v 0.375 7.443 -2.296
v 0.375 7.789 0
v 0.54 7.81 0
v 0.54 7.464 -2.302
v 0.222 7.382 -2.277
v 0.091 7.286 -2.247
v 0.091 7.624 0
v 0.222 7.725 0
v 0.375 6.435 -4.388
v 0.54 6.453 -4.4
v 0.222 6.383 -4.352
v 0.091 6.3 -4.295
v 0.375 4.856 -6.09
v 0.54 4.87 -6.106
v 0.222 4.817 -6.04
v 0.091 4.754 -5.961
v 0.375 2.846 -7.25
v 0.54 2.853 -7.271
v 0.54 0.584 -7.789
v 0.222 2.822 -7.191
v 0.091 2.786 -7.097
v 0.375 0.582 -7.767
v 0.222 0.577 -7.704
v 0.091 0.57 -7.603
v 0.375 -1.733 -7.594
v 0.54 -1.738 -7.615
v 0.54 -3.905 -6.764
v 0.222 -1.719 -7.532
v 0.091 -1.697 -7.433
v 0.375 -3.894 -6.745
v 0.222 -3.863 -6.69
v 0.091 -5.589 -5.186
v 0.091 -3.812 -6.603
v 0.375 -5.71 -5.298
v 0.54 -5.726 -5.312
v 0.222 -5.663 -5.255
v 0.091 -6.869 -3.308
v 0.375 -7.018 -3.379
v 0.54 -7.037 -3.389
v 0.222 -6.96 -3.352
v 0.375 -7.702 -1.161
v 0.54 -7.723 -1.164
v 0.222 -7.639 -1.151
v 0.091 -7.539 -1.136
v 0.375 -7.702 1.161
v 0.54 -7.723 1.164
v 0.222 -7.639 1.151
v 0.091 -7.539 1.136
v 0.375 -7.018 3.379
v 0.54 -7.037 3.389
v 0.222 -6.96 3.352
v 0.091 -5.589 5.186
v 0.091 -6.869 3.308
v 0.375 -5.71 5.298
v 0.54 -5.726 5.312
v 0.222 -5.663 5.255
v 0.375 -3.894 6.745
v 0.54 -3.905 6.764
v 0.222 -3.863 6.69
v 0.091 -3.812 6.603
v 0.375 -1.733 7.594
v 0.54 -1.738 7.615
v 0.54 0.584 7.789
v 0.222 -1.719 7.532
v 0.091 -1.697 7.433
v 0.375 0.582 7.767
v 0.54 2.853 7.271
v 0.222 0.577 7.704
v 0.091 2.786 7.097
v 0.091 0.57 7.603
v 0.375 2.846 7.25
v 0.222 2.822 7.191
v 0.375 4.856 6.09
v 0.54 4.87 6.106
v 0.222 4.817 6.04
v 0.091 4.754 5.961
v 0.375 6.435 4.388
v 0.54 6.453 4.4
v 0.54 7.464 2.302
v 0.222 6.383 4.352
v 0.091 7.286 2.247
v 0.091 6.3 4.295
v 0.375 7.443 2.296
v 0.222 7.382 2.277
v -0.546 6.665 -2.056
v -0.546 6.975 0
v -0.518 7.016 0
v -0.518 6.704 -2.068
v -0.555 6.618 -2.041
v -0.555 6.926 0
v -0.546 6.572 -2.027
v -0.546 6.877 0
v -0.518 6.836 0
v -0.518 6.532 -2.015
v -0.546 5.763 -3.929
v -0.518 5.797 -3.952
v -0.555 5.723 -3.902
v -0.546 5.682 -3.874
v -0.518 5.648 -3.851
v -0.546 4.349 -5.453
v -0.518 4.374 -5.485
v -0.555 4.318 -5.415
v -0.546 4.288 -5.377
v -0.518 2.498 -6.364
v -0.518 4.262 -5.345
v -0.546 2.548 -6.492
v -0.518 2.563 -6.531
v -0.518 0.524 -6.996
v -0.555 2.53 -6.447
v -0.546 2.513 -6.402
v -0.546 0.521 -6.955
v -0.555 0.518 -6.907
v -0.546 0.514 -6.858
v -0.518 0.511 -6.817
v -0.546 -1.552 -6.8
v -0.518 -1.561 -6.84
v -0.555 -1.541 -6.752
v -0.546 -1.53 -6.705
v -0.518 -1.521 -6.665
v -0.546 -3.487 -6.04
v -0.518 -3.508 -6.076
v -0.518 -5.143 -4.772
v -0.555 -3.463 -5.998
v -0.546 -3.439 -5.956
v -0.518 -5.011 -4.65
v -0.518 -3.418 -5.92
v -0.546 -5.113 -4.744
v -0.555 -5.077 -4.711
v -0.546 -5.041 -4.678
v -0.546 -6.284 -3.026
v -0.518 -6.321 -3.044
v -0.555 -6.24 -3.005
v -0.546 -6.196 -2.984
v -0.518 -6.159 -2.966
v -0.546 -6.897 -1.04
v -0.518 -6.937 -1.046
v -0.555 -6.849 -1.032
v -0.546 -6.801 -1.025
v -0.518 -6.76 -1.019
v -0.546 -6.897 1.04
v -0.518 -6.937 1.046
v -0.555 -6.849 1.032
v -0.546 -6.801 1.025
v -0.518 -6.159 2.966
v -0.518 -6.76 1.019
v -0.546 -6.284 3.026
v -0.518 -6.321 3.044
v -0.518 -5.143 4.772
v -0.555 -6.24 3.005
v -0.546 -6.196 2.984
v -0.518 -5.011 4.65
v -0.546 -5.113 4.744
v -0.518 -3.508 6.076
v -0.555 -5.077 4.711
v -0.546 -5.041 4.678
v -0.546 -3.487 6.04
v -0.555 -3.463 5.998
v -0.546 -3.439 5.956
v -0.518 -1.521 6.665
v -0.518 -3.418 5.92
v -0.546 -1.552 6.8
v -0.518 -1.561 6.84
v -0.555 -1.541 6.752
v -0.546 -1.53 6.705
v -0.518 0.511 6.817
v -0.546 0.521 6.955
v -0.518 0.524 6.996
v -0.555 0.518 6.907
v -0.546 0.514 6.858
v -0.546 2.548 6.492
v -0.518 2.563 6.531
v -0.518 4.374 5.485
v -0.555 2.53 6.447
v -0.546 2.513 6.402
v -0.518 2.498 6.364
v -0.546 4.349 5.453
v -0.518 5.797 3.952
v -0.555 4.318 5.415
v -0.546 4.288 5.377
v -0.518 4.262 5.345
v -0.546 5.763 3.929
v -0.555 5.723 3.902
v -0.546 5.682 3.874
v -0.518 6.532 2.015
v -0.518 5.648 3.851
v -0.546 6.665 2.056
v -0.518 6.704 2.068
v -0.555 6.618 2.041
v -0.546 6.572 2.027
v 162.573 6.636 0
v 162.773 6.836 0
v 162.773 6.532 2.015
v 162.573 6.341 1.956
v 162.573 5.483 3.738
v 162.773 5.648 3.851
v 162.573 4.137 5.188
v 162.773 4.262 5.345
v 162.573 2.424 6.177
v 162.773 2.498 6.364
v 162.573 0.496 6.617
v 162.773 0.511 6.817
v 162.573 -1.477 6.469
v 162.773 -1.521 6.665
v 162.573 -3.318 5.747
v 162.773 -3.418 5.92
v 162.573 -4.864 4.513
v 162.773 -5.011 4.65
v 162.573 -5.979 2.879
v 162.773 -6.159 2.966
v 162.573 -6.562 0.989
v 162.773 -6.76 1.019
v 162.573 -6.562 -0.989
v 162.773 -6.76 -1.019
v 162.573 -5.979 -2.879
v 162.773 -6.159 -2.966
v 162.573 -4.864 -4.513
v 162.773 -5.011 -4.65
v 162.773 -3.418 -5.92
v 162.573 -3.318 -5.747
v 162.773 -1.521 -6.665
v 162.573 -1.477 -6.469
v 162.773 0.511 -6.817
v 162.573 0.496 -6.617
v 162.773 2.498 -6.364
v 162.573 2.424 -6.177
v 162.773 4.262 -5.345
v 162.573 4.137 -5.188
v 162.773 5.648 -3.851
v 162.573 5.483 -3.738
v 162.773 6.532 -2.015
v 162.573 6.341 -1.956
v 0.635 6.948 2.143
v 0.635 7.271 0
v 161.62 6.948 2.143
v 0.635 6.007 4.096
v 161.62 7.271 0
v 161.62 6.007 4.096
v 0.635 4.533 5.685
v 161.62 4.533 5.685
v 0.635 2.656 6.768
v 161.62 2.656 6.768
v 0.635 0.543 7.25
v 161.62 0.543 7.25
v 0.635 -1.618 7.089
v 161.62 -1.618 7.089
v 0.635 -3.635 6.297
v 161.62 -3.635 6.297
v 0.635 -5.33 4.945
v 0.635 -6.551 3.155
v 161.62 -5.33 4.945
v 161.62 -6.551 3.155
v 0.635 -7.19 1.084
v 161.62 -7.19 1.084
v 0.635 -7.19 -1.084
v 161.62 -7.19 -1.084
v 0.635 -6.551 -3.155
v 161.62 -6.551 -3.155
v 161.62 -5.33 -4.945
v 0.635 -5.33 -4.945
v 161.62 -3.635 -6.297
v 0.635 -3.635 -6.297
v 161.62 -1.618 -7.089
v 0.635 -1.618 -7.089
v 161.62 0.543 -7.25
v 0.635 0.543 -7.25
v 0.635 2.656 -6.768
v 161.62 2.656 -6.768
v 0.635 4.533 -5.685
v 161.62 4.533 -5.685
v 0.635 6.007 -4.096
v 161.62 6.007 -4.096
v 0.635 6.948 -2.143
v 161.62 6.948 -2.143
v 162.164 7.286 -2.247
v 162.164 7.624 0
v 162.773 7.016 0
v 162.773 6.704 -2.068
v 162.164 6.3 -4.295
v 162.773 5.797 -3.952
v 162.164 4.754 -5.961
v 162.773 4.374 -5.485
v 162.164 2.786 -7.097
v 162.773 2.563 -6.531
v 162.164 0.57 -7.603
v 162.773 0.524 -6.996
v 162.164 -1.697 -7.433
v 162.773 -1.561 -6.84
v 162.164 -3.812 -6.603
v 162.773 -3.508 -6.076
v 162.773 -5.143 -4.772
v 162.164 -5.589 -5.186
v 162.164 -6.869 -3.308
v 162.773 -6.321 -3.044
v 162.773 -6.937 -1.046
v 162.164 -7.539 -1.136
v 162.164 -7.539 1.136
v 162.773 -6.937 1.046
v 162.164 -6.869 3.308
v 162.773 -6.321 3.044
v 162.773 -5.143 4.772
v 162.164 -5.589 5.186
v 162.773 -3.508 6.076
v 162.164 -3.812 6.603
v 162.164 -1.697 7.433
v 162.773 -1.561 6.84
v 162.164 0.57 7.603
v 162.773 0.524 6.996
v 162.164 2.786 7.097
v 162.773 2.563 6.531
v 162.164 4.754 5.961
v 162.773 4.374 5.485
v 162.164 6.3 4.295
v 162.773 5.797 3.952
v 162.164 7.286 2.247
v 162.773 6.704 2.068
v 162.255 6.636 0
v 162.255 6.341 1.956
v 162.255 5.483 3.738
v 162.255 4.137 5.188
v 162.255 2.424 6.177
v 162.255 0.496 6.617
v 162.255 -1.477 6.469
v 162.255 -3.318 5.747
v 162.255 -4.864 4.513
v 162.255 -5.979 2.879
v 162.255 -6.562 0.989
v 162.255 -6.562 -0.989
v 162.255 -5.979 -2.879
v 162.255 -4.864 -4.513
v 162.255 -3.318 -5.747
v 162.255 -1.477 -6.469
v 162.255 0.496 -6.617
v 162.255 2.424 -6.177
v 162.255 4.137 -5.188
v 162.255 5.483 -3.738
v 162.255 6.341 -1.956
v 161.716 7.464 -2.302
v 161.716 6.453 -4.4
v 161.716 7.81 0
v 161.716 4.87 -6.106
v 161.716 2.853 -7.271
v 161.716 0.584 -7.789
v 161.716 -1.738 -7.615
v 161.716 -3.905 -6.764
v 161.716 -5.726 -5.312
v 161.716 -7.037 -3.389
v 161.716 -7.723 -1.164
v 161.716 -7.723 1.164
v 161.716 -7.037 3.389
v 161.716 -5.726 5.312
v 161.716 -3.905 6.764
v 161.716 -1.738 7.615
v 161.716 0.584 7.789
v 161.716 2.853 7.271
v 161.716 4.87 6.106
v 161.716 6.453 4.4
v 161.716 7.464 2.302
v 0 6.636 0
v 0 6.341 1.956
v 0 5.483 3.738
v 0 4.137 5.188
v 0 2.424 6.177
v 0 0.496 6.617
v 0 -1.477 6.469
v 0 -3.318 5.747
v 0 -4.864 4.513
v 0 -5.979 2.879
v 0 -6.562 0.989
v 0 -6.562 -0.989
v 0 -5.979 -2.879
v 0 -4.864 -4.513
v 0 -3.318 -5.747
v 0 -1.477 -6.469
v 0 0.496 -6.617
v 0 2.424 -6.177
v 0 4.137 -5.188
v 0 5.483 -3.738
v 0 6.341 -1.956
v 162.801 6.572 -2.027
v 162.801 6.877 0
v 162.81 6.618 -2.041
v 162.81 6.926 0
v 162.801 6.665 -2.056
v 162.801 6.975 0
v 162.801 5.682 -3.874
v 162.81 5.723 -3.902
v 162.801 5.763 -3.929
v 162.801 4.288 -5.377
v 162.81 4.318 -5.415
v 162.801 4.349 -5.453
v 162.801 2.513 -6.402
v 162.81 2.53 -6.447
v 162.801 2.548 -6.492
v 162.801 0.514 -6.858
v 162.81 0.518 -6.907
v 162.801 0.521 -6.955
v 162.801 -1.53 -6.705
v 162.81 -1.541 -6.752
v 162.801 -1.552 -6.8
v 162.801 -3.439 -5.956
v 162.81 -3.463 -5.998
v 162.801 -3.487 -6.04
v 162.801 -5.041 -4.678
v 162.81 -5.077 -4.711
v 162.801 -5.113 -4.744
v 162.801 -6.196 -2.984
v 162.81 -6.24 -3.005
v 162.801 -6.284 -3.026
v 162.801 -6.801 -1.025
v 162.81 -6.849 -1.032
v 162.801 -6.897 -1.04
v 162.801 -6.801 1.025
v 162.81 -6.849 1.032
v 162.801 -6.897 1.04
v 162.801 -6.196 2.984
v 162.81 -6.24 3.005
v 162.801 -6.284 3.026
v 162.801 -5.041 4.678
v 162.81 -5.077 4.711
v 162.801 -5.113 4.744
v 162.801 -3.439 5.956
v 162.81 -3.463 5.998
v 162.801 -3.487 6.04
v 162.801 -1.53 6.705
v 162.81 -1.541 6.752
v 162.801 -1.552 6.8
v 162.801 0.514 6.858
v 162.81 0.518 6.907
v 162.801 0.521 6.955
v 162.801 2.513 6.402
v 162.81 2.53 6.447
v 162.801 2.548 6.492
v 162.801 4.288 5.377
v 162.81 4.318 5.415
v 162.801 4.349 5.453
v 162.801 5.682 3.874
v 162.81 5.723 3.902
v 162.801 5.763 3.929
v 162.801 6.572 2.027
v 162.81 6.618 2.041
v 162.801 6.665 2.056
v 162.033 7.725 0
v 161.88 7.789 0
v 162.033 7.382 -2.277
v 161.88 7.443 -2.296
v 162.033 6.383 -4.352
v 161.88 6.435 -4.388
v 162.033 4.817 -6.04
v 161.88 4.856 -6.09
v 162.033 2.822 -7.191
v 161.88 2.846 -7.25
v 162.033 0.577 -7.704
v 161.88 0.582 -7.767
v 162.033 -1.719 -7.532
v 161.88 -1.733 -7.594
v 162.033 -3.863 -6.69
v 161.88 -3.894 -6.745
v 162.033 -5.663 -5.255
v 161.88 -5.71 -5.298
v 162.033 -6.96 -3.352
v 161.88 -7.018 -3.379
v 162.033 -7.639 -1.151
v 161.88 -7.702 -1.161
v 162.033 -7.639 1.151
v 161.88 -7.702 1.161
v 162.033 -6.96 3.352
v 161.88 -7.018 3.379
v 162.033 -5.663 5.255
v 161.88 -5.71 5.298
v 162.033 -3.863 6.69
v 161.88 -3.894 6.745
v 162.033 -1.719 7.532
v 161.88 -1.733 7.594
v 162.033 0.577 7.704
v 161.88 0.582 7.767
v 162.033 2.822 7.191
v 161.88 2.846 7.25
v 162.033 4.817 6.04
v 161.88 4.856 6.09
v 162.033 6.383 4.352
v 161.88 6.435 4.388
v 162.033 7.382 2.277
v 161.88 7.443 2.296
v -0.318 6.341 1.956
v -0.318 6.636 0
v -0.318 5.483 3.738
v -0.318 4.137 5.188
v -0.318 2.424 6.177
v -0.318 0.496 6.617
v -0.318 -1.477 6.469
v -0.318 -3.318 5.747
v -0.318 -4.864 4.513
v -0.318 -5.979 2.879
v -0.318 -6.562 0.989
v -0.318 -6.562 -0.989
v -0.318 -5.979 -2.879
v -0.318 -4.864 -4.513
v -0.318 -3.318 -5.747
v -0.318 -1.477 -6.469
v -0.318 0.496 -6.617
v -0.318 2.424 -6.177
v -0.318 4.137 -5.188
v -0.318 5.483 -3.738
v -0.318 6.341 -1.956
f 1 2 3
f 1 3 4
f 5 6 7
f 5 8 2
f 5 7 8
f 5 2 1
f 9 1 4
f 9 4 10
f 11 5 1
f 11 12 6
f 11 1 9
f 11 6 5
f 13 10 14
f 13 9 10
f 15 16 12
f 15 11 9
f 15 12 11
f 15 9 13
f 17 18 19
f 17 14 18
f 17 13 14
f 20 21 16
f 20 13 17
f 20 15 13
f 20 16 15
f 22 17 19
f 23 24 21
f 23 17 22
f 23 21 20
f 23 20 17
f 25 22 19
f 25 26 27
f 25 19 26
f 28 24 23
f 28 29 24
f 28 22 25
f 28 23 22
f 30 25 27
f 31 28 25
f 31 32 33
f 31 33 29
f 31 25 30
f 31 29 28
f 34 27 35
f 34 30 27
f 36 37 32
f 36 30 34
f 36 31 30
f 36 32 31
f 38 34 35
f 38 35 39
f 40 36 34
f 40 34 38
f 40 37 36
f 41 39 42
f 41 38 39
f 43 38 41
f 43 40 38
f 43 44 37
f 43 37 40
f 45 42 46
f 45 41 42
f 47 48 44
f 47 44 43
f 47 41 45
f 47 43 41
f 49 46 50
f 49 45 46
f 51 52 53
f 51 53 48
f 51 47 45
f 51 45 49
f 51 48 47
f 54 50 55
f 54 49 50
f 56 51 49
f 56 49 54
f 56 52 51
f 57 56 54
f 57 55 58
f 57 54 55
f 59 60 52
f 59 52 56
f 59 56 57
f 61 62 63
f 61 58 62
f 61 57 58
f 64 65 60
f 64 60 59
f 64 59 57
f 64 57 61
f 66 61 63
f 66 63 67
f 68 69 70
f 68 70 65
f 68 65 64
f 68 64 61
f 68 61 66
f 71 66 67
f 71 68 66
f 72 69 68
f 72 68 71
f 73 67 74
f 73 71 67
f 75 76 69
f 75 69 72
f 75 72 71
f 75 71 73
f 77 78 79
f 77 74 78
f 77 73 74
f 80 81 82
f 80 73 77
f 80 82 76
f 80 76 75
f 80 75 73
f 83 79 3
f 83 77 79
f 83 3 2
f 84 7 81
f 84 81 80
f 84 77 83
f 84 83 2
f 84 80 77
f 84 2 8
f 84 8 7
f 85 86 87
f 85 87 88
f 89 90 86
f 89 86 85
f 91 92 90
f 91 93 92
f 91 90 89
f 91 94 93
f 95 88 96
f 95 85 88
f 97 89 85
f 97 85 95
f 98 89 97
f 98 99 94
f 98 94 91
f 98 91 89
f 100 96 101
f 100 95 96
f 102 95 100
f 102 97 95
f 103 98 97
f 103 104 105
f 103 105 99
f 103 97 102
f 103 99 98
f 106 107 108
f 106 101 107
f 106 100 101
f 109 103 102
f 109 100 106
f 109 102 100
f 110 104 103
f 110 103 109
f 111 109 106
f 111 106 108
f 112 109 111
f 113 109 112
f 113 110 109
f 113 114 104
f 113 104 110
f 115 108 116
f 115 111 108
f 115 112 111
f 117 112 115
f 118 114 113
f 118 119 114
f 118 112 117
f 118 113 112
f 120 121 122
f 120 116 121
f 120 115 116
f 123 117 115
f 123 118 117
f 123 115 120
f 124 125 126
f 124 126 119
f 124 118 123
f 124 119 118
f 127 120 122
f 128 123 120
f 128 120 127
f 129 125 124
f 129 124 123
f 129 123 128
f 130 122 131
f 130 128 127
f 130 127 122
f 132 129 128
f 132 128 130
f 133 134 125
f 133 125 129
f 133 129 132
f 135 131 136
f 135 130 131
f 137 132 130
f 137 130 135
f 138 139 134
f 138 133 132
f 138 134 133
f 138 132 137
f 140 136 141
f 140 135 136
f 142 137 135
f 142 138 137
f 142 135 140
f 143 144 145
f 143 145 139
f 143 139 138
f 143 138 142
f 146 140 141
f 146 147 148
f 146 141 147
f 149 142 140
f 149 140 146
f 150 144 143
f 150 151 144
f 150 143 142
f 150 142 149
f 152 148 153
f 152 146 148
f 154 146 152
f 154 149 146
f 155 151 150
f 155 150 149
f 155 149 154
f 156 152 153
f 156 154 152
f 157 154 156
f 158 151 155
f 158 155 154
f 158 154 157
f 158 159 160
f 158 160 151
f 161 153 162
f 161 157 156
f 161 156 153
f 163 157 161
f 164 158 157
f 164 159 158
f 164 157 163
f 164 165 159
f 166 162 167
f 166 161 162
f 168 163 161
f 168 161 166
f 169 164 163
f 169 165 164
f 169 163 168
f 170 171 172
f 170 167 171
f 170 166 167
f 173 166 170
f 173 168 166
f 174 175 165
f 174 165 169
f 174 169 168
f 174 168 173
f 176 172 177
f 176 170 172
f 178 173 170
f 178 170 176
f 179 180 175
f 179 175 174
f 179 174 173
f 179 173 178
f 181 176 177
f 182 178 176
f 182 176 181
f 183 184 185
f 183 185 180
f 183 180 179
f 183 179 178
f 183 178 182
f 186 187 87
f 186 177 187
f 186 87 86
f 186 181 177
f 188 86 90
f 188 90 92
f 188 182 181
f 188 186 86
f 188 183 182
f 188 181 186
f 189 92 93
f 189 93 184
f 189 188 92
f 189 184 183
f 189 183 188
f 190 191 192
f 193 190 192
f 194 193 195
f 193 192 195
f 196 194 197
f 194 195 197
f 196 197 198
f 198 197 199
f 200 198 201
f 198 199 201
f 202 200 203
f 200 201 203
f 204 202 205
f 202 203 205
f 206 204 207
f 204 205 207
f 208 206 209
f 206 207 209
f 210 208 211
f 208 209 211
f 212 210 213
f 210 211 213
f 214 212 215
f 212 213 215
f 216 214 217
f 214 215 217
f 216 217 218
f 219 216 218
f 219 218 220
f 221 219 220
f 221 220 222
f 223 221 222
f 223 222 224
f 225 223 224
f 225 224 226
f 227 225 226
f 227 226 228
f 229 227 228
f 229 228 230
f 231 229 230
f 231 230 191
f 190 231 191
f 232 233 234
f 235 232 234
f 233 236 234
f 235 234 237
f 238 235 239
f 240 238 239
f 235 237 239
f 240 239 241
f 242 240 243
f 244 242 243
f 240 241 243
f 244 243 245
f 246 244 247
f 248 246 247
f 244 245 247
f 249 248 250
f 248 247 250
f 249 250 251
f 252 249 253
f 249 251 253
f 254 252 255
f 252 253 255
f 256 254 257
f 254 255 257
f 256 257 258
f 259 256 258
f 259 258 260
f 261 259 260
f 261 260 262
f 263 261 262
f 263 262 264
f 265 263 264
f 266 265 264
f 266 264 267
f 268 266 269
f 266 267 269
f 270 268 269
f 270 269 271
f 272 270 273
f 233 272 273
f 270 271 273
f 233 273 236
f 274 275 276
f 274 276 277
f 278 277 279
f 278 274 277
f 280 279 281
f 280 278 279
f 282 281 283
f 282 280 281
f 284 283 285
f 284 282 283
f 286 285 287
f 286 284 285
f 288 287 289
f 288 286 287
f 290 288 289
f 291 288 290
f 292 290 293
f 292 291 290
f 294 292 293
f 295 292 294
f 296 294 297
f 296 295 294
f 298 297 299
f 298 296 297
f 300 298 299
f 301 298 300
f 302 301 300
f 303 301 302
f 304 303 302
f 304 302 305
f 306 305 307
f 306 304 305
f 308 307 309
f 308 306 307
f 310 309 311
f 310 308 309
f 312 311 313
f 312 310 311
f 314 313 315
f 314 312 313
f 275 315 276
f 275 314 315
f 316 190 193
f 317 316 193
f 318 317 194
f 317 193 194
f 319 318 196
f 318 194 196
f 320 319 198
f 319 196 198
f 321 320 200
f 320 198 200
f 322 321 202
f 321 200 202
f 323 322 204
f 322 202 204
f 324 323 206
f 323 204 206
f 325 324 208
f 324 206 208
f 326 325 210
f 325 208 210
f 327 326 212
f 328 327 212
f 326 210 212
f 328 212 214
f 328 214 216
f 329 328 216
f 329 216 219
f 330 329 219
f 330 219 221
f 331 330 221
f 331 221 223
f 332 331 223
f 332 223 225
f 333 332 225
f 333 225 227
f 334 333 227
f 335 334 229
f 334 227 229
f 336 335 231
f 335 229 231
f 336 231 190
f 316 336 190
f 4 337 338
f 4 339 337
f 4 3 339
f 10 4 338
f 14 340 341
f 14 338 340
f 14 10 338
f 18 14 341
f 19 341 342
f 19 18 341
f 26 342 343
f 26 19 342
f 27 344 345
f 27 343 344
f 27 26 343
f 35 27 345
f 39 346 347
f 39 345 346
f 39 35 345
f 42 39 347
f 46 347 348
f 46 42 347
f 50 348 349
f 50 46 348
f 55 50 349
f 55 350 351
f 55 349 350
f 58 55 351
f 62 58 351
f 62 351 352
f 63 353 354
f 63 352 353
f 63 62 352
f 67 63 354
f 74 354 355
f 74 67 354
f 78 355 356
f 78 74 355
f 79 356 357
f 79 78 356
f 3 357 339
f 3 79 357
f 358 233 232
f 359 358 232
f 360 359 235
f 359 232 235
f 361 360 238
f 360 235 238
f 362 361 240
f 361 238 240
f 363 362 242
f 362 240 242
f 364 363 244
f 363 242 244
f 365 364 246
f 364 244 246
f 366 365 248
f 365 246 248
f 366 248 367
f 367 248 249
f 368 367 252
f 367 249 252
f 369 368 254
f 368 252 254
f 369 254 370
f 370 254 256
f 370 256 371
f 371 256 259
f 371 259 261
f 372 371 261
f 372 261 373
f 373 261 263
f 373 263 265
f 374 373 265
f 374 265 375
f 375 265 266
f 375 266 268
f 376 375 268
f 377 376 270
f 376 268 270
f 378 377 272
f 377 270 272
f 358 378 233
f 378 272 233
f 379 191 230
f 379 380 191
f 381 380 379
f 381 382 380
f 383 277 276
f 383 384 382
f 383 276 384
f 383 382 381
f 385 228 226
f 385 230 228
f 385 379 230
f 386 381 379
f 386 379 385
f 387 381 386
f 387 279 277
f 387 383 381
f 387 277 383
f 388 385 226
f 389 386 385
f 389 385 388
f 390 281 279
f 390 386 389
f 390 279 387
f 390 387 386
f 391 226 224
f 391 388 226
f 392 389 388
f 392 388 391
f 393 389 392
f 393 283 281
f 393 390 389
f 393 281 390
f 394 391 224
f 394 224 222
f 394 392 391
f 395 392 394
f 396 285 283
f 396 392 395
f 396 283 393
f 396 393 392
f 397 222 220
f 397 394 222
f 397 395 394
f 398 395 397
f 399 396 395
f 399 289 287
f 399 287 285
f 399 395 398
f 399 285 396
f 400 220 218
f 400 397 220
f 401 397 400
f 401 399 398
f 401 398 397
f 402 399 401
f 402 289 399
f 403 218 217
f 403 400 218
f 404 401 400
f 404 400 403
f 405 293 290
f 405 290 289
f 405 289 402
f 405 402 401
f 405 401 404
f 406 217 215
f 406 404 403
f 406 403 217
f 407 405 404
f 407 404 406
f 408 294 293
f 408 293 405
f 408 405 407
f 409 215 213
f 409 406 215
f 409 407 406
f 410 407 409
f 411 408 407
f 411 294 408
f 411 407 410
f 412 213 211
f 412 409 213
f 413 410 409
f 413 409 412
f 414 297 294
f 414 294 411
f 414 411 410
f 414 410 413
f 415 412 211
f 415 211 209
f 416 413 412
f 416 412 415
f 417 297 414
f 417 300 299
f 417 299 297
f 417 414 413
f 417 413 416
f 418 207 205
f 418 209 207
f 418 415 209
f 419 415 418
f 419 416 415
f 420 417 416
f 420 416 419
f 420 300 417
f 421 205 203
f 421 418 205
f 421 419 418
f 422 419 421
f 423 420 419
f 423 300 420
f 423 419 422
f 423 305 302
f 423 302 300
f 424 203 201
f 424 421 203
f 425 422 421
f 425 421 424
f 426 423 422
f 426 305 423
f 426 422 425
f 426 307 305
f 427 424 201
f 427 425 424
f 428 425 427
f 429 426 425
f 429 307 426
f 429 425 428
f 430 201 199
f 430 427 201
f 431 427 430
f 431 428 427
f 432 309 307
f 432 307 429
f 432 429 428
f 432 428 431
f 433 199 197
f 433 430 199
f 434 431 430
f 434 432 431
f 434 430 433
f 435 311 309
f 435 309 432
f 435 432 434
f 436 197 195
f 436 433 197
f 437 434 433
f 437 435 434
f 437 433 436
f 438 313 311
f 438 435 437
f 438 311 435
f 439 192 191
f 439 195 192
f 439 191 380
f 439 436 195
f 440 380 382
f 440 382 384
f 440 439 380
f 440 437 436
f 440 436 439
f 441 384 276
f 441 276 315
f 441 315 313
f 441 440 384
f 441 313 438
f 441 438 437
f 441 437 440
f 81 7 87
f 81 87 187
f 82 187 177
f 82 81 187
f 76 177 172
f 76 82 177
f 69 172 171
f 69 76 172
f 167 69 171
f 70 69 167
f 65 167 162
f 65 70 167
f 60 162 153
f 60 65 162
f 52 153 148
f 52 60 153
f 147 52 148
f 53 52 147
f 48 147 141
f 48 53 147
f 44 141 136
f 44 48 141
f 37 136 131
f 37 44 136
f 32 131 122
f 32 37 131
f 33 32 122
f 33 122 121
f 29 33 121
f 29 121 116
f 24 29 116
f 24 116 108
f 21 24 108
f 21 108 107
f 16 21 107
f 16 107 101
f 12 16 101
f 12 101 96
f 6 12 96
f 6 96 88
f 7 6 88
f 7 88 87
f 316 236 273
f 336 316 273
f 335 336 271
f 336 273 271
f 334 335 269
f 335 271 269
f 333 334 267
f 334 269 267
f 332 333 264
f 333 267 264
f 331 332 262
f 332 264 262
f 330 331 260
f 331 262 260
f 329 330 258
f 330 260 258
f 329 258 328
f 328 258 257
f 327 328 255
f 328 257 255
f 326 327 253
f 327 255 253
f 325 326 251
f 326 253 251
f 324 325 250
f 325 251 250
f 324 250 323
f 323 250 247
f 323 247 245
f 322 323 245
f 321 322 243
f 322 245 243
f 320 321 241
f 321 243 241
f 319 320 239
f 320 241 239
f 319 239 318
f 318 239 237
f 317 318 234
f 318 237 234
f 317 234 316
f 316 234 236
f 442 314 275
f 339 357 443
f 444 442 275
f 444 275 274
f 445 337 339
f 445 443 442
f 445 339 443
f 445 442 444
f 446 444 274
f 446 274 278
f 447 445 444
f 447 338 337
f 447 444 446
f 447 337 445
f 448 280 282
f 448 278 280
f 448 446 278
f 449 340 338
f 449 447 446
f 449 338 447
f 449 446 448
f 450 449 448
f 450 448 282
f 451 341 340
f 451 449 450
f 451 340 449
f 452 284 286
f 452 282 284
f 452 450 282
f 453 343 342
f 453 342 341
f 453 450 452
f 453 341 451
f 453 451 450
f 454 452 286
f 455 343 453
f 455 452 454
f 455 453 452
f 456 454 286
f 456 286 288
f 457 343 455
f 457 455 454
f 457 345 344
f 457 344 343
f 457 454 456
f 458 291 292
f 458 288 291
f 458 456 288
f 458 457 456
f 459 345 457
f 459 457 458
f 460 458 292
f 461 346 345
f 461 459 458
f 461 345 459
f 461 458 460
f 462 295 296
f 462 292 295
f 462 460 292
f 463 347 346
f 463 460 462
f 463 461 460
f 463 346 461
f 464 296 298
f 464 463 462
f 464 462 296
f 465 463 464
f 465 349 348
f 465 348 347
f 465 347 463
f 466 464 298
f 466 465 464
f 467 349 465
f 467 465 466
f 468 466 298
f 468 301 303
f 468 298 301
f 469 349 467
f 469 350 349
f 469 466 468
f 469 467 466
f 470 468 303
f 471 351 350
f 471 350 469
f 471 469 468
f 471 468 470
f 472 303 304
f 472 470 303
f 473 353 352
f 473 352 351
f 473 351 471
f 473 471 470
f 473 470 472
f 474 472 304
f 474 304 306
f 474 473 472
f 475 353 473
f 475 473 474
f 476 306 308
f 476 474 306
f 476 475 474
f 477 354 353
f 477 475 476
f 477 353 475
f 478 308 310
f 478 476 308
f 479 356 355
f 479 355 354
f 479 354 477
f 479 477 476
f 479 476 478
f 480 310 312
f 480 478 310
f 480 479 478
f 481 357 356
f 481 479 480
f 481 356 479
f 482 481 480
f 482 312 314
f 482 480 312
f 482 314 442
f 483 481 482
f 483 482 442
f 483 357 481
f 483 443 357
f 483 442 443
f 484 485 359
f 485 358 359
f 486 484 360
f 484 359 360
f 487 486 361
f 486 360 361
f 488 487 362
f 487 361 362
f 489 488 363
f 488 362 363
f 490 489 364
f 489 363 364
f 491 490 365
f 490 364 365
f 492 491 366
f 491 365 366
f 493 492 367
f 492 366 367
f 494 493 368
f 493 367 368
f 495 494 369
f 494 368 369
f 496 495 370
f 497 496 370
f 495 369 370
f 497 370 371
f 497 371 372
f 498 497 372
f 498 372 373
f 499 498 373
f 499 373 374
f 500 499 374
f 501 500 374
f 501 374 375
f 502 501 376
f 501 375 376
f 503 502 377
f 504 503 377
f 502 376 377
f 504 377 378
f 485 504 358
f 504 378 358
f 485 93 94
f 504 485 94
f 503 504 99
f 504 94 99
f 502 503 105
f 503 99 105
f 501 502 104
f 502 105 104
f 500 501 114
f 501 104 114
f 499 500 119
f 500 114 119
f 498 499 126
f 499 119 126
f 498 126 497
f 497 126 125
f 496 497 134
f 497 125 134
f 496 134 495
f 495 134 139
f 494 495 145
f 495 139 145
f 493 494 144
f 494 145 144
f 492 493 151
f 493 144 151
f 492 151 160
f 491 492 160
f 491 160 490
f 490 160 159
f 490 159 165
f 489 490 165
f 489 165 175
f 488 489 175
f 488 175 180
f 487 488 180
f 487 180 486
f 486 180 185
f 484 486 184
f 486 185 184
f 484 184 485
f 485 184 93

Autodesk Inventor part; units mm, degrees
sketch "Sketch_1" plane through (0, 0, 0) normal (0, 0, 1) x (1, 0, 0)
  line L0 (162.2552, 0) -> (0, 0)
  arc A0 (-0.518, 7.0158) -> (-0.518, 6.8362) centre (-0.4282, 6.926) ccw
  line L1 (-0.518, 6.8362) -> (-0.3175, 6.6357)
  line L2 (-0.3175, 6.6357) -> (0, 6.6357)
  line L3 (0, 6.6357) -> (0.635, 7.2708)
  line L4 (0.635, 7.2708) -> (161.6202, 7.2708)
  line L5 (161.6202, 7.2708) -> (162.2552, 6.6357)
  line L6 (162.2552, 6.6357) -> (162.5727, 6.6357)
  line L7 (162.5727, 6.6357) -> (162.7732, 6.8362)
  arc A1 (162.7732, 6.8362) -> (162.7732, 7.0158) centre (162.6834, 6.926) ccw
  line L8 (162.7732, 7.0158) -> (162.1645, 7.6245)
  arc A2 (162.1645, 7.6245) -> (161.7155, 7.8105) centre (161.7154, 7.1755) ccw
  line L9 (161.7155, 7.8105) -> (0.5398, 7.8105)
  arc A3 (0.5398, 7.8105) -> (0.0907, 7.6245) centre (0.5397, 7.1755) ccw
  line L10 (0.0907, 7.6245) -> (-0.518, 7.0158)
revolve "Revolution1" add sketch "Sketch_1" angle 360 about axis through (162.2552, 0, 0) along (1, 0, 0)
ref_plane "tube_front_XY" through (0, 0, 0) normal (1, 0, 0) x (0, 0, -1)
ref_plane "tube_front_YZ" through (0, 0, 0) normal (0, 0, -1) x (0, 1, 0)
ref_plane "tube_front_ZX" through (0, 0, 0) normal (0, 1, 0) x (1, 0, 0)
ref_plane "tube_rear_XY" through (162.2552, 0, 0) normal (1, 0, 0) x (0, 0, -1)
ref_plane "tube_rear_YZ" through (162.2552, 0, 0) normal (0, 0, -1) x (0, 1, 0)
ref_plane "tube_rear_ZX" through (162.2552, 0, 0) normal (0, 1, 0) x (1, 0, 0)
ref_plane "cp1_XY" through (81.1276, 7.8105, 0) normal (1, 0, 0) x (0, 0, -1)
ref_plane "cp1_YZ" through (81.1276, 7.8105, 0) normal (0, 0, -1) x (0, 1, 0)
ref_plane "cp1_ZX" through (81.1276, 7.8105, 0) normal (0, 1, 0) x (1, 0, 0)
ref_plane "cp2_XY" through (81.1276, 0, -7.8105) normal (1, 0, 0) x (0, 0, -1)
ref_plane "cp2_YZ" through (81.1276, 0, -7.8105) normal (0, 0, -1) x (0, 1, 0)
ref_plane "cp2_ZX" through (81.1276, 0, -7.8105) normal (0, 1, 0) x (1, 0, 0)
ref_plane "cp3_XY" through (81.1276, -7.8105, 0) normal (1, 0, 0) x (0, 0, -1)
ref_plane "cp3_YZ" through (81.1276, -7.8105, 0) normal (0, 0, -1) x (0, 1, 0)
ref_plane "cp3_ZX" through (81.1276, -7.8105, 0) normal (0, 1, 0) x (1, 0, 0)
ref_plane "cp4_XY" through (81.1276, 0, 7.8105) normal (1, 0, 0) x (0, 0, -1)
ref_plane "cp4_YZ" through (81.1276, 0, 7.8105) normal (0, 0, -1) x (0, 1, 0)
ref_plane "cp4_ZX" through (81.1276, 0, 7.8105) normal (0, 1, 0) x (1, 0, 0)
properties part number "02-6.3880-nr"
